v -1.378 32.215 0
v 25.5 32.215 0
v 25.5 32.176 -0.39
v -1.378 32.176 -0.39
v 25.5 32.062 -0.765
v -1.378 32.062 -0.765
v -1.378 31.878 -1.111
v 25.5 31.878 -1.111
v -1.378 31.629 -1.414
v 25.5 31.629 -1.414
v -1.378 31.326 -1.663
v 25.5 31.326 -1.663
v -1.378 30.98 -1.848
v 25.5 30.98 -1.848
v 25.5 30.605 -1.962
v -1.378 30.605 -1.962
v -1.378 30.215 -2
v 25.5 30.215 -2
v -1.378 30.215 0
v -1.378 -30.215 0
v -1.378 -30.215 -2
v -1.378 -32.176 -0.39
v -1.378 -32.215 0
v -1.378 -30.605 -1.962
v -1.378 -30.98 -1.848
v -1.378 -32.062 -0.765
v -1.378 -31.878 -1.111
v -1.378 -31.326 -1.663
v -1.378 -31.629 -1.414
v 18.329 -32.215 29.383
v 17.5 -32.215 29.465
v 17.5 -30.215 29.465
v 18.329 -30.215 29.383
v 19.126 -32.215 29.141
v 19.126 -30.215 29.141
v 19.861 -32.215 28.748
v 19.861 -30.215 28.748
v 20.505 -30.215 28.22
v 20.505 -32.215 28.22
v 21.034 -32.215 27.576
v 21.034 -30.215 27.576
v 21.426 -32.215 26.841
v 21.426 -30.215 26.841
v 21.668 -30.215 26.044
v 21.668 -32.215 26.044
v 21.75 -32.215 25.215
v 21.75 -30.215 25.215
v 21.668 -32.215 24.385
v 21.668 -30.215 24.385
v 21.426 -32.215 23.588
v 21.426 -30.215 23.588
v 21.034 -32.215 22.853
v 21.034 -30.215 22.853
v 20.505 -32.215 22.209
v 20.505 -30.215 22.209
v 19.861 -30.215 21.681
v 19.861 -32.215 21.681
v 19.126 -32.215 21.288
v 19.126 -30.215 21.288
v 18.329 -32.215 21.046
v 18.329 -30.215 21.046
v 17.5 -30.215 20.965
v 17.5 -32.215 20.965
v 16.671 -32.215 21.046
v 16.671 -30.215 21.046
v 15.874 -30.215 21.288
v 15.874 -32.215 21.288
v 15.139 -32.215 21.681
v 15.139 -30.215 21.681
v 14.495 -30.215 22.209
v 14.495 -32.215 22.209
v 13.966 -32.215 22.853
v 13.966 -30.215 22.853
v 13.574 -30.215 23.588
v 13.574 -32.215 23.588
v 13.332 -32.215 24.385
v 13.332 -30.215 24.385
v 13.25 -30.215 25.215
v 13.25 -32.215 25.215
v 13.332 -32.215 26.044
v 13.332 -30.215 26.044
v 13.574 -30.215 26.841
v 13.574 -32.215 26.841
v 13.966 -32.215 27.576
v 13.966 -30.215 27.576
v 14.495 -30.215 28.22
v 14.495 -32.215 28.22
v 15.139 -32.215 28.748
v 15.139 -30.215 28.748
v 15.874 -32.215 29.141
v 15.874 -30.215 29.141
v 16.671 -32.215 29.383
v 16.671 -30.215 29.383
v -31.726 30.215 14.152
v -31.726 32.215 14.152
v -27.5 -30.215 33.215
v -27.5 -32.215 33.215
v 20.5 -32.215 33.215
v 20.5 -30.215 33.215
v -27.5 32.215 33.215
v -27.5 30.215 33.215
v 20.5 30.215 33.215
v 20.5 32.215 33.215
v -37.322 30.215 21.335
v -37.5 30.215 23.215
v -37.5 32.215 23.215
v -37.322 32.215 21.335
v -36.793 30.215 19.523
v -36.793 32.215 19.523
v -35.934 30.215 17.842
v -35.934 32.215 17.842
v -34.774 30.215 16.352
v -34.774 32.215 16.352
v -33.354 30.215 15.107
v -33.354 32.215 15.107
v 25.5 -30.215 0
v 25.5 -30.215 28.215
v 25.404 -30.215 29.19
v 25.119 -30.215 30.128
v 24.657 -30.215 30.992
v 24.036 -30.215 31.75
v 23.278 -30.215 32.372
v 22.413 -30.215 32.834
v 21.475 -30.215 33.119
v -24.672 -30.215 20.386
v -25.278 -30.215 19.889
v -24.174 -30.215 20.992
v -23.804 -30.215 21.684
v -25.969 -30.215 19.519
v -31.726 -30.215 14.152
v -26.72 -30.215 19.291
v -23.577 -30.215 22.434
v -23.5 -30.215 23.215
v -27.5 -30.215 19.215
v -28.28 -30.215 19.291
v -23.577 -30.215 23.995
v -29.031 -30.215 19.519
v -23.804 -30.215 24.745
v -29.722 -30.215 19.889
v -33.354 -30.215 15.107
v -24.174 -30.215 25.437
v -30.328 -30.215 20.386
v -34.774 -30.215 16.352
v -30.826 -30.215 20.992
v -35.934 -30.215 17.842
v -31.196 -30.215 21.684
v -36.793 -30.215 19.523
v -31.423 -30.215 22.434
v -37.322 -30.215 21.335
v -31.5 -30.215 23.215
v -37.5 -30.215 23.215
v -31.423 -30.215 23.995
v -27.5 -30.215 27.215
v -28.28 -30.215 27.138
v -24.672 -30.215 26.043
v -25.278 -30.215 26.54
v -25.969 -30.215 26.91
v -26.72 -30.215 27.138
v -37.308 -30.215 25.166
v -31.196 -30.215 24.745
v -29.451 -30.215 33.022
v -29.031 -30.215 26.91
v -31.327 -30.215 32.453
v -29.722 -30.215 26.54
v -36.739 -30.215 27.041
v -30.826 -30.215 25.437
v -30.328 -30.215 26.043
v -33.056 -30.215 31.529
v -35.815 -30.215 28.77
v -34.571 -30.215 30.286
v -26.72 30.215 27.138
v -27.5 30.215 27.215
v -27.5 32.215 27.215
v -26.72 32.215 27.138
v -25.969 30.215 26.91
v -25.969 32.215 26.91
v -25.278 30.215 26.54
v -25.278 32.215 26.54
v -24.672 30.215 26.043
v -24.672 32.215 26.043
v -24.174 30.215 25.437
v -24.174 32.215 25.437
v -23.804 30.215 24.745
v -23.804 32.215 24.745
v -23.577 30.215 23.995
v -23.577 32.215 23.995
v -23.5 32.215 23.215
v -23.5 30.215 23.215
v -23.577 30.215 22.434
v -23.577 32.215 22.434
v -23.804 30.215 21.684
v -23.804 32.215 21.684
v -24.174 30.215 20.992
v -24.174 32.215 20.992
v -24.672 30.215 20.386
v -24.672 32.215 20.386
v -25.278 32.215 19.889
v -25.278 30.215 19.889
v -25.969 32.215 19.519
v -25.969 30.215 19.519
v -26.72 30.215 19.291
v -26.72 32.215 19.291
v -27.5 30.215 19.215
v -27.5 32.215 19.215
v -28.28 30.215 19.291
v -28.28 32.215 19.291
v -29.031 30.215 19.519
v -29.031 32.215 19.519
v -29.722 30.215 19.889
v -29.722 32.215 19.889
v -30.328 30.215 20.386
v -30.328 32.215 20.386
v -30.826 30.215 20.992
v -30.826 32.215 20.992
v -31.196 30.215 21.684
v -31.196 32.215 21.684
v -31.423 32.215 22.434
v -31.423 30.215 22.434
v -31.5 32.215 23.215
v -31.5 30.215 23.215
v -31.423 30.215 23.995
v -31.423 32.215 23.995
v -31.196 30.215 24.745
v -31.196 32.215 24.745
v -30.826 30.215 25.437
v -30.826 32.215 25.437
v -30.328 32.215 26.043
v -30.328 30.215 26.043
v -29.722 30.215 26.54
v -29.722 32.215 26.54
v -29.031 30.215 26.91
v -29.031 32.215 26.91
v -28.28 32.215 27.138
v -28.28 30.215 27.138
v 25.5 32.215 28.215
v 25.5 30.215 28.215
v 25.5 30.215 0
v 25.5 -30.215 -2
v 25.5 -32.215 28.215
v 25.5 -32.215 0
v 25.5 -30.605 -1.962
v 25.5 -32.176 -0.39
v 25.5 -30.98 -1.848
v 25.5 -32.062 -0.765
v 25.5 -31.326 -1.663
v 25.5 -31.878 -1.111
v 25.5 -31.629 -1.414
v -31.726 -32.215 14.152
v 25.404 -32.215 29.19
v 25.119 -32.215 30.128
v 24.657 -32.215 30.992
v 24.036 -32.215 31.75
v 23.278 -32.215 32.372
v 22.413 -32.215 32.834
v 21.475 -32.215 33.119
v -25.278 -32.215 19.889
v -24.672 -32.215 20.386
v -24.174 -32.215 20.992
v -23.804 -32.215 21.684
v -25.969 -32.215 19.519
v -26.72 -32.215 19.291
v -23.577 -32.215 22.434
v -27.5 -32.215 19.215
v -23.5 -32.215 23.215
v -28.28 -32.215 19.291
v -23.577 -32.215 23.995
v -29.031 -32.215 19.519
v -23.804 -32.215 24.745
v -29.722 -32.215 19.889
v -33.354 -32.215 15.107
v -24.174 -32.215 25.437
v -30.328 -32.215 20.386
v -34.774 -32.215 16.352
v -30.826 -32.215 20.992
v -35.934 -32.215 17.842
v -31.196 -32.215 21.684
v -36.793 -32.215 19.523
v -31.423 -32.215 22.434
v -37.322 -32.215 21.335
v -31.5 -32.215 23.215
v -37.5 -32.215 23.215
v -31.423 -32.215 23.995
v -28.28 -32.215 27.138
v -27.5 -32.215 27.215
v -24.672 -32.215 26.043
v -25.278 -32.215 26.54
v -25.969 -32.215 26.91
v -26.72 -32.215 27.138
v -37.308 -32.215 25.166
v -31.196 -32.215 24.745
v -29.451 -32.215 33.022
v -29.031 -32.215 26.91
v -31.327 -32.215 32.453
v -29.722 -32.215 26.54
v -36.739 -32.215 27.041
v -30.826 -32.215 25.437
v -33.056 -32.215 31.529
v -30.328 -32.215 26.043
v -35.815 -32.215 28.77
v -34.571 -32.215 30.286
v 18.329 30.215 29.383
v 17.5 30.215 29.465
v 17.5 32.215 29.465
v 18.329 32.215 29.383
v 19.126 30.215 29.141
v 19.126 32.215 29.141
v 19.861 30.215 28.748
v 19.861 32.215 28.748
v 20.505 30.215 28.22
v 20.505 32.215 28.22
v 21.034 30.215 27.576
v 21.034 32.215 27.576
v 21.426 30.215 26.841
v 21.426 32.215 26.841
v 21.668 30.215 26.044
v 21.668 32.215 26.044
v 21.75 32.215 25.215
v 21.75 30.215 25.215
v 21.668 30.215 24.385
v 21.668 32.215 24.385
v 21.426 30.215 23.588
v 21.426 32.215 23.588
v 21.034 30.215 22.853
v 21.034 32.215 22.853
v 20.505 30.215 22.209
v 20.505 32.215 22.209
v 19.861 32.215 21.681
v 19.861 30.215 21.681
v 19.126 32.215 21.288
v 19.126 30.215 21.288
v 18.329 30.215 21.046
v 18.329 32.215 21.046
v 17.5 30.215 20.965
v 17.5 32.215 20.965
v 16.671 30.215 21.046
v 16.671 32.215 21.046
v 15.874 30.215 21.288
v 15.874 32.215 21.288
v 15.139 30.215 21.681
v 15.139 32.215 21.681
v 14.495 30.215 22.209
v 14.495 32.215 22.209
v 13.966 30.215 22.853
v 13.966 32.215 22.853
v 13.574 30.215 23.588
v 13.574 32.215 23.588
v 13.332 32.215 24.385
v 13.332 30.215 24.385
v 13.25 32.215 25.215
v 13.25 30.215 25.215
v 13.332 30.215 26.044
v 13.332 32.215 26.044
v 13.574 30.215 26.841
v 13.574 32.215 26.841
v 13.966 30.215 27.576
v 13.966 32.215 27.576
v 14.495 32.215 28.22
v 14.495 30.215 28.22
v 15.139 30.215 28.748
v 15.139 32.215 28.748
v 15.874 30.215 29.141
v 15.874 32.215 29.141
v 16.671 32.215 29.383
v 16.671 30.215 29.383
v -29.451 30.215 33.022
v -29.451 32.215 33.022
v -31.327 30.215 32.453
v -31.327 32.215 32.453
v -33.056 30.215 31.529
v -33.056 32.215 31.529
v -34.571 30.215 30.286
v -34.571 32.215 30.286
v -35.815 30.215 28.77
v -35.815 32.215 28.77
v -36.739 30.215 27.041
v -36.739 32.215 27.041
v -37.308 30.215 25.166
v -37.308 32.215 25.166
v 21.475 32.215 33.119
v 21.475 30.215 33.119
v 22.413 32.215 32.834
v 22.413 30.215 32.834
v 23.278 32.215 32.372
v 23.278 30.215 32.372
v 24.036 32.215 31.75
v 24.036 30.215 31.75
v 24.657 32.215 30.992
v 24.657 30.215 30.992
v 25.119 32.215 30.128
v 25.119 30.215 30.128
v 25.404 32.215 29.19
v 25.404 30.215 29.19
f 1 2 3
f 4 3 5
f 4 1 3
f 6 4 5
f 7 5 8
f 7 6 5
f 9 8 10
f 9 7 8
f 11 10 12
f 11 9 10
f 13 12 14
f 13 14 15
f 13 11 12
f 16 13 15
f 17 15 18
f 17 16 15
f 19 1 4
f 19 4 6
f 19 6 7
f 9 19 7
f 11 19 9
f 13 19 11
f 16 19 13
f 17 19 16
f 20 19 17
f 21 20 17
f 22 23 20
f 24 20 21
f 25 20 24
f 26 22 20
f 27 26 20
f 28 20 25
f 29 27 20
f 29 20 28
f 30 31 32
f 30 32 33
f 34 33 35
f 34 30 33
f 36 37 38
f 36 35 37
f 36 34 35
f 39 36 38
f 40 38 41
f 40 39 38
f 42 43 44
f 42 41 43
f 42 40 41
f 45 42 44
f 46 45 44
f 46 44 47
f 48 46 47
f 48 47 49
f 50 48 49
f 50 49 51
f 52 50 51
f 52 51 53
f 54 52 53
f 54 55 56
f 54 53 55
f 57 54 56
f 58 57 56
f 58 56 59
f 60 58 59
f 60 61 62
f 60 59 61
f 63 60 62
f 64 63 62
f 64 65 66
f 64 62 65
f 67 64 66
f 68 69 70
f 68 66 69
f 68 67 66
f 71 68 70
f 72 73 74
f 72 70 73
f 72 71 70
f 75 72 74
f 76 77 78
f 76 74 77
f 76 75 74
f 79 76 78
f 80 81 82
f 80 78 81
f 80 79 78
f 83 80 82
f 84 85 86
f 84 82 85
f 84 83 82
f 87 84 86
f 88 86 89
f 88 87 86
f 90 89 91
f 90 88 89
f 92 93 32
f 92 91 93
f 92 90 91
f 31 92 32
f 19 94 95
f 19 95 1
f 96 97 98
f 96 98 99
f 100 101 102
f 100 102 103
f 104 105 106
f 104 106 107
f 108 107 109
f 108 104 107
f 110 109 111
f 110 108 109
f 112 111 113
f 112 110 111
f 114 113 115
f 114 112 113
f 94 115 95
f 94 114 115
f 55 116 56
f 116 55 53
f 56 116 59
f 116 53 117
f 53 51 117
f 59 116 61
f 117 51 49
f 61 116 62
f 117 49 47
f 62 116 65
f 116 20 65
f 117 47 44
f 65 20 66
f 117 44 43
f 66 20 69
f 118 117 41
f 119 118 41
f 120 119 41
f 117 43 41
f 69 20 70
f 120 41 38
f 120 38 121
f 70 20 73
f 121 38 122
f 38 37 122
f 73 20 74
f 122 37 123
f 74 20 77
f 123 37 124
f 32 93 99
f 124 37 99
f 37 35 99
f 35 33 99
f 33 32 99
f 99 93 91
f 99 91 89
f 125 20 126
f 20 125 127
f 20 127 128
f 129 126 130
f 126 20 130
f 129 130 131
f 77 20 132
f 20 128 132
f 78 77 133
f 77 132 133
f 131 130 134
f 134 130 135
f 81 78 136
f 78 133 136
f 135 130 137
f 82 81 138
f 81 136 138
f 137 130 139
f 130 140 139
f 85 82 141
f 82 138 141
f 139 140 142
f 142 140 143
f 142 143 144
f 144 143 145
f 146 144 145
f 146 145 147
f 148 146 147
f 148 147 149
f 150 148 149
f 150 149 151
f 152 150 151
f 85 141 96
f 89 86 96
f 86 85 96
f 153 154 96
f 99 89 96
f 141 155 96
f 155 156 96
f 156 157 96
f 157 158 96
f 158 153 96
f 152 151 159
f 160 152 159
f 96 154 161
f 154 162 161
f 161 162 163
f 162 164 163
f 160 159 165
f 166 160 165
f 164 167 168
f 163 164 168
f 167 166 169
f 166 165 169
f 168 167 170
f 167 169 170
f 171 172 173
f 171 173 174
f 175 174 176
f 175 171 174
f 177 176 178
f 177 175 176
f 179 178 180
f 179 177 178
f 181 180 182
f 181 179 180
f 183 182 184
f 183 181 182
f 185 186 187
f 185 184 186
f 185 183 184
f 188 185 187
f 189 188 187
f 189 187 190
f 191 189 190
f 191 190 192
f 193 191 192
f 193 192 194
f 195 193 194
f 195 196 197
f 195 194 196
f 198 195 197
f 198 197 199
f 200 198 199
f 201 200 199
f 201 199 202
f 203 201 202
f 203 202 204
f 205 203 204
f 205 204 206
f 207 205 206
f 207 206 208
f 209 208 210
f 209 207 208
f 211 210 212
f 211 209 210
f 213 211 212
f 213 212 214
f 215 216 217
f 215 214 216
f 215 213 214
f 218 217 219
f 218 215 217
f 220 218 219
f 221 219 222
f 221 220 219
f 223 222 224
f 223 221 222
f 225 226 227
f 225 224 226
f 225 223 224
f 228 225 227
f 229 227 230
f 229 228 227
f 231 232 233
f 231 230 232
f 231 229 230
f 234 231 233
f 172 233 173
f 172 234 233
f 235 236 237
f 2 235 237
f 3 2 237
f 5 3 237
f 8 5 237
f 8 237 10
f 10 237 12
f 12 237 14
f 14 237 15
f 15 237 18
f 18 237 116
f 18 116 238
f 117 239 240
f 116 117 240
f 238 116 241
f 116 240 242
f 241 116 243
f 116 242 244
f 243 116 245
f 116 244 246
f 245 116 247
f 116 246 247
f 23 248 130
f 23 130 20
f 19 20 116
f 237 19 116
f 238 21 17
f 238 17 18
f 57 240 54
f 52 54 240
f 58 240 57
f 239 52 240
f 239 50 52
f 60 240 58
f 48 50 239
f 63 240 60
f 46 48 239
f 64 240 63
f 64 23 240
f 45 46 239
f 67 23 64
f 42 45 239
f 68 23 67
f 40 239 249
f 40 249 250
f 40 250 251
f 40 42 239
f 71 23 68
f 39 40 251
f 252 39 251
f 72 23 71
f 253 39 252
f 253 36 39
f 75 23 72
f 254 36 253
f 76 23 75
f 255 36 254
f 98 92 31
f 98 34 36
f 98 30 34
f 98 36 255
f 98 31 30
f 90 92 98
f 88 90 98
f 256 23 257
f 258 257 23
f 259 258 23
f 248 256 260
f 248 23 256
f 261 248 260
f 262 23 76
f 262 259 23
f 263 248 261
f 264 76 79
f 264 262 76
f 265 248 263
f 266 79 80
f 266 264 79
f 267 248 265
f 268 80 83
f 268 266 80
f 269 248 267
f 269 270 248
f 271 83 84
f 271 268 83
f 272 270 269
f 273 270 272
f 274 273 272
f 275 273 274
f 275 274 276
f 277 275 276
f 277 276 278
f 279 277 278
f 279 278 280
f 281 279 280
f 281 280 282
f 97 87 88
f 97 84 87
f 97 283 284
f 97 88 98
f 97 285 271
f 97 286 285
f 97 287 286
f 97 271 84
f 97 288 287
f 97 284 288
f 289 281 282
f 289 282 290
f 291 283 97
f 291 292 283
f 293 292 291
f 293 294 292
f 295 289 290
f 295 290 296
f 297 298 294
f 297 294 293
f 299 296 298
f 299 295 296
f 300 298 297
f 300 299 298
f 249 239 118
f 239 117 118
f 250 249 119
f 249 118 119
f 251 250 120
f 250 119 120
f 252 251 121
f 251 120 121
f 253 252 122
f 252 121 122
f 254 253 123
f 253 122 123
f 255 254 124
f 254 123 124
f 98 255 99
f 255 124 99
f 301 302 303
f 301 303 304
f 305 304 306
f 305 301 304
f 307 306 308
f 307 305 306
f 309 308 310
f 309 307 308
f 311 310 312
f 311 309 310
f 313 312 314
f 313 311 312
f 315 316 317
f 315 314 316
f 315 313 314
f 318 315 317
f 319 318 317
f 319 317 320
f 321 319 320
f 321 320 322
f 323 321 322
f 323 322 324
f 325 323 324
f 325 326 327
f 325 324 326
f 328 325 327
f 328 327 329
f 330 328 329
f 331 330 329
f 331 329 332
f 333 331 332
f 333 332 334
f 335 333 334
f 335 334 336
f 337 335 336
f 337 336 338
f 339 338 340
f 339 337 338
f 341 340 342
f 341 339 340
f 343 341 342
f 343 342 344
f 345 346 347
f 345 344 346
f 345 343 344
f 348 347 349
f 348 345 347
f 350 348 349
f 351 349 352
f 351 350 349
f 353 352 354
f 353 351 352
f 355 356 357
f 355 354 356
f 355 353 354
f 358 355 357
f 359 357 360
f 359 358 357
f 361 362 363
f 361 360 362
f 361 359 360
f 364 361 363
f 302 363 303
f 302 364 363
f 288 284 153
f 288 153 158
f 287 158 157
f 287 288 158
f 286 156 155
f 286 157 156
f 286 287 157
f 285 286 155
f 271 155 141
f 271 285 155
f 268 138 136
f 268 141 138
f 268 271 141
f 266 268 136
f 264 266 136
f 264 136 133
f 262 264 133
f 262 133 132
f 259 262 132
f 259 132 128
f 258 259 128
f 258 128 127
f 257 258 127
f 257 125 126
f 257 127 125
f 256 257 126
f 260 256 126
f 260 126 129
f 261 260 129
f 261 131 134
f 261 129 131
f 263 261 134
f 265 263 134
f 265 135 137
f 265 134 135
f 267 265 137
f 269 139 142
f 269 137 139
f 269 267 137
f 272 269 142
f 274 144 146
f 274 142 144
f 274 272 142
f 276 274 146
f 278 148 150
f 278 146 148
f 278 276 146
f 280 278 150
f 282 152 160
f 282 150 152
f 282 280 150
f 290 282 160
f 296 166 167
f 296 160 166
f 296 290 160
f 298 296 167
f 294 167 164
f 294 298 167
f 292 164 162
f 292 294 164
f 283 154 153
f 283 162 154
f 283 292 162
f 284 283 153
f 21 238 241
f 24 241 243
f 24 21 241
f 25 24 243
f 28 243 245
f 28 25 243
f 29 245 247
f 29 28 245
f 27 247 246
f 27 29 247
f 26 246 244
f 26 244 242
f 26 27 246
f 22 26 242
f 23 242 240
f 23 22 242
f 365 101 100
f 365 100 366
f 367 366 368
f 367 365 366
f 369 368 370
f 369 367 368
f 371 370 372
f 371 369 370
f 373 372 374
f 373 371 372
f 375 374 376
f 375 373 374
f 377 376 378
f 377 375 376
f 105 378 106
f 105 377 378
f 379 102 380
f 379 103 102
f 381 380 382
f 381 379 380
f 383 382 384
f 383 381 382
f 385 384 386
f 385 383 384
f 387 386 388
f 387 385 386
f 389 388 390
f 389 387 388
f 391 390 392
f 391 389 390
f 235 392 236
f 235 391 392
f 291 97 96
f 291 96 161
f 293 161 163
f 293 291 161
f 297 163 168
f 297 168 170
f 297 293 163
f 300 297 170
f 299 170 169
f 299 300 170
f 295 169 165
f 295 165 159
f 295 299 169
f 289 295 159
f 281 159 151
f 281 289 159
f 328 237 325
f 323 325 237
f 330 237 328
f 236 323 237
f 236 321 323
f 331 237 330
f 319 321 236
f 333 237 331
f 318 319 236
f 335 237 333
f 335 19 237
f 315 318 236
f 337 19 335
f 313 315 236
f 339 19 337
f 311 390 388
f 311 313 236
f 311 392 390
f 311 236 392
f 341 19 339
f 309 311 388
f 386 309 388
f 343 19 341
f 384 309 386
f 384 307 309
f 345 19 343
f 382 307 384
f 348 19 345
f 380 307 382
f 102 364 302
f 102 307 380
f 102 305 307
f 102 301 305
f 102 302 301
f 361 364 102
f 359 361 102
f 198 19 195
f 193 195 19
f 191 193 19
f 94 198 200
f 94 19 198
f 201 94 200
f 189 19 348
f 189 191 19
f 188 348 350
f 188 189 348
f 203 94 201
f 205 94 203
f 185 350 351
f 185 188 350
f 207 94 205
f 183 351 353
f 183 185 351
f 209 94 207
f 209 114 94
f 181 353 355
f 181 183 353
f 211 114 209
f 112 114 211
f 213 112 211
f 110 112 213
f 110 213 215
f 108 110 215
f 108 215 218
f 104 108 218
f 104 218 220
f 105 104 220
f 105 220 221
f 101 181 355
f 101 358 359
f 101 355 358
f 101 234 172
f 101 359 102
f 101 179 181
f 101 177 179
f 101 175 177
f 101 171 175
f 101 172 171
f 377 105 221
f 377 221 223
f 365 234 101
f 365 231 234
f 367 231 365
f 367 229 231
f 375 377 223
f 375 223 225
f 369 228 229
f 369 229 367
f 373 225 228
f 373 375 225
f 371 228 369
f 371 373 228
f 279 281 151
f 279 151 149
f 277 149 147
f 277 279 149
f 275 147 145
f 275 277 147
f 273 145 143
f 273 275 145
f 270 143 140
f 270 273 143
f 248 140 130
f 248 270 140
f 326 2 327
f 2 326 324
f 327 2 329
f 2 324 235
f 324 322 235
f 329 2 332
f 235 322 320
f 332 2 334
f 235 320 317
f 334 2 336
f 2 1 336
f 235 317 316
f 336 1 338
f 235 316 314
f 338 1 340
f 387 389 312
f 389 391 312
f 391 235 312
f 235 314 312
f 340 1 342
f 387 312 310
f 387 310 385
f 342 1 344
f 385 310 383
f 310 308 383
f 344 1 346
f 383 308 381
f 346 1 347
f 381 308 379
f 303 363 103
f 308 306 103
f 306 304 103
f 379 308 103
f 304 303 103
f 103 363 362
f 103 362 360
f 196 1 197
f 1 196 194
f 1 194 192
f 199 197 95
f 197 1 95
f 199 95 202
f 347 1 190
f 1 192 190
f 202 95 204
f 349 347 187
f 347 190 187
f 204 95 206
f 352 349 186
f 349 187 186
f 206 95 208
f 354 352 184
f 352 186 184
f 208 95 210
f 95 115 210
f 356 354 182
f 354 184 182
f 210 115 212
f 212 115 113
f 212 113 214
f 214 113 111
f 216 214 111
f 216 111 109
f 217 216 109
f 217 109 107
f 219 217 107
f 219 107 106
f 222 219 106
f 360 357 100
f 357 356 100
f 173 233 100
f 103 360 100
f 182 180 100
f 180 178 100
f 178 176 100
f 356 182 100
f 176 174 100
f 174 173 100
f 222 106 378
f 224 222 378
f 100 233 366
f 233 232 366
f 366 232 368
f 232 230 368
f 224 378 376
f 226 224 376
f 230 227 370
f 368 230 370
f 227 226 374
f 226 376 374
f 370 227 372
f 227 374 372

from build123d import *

# Parameters (mm, degrees)
SKETCH1_W                  = 75
SKETCH1_H                  = 130
BASE_FLANGE1_DEPTH         = 2
SKETCHED_START             = -37.5
SKETCHED_BEND1_DEPTH       = 75
SKETCHED_BEND1_2_OUTLINE_W = 2
SKETCHED_BEND1_2_OUTLINE_H = 33.214601837
SKETCHED_BEND1_2_DEPTH     = 75
CUT_EXTRUDE1_START         = -64.429203673
CUT_EXTRUDE1_DEPTH         = 64.429203673
CUT_EXTRUDE2_DEPTH         = 82.61238914
CUT_EXTRUDE2_DEPTH_BACK    = 82.61238914
SKETCH9_R                  = 4
CUT_EXTRUDE3_DEPTH         = 82.61238914
CUT_EXTRUDE3_DEPTH_BACK    = 82.61238914
SKETCH10_R                 = 4.25
SKETCH10_W                 = 12
SKETCH10_H                 = 100
FILLET7_R                  = 5


# Read off the part's stored shape, not the designer's step: Sketched Bend1, Cut-Extrude1
# Sheet-metal steps are written as plain solids
with BuildPart() as part:
    # Sketch1 → Base-Flange1 (new body)
    with BuildSketch(Plane.XY):
        Rectangle(SKETCH1_W, SKETCH1_H)
    extrude(amount=-BASE_FLANGE1_DEPTH)

    # Sketched Bend1 outline → Sketched Bend1 (cut)
    with BuildSketch(Plane.YZ.offset(SKETCHED_START)):
        with BuildLine():
            Line((65, 0), (32.214601837, 0))
            ThreePointArc((32.214601837, 0), (31.628815399, -1.414213562), (30.214601837, -2))
            Line((30.214601837, -2), (65, -2))
            Line((65, -2), (65, 0))
        make_face()
        with BuildLine():
            Line((-65, -2), (-30.214601837, -2))
            ThreePointArc((-30.214601837, -2), (-31.628815399, -1.414213562), (-32.214601837, 0))
            Line((-32.214601837, 0), (-65, 0))
            Line((-65, 0), (-65, -2))
        make_face()
    extrude(amount=SKETCHED_BEND1_DEPTH, mode=Mode.SUBTRACT)

    # Sketched Bend1 2 outline → Sketched Bend1 2 (add)
    with BuildSketch(Plane.YZ.offset(SKETCHED_START)):
        with Locations((31.214601837, 16.607300919)):
            Rectangle(SKETCHED_BEND1_2_OUTLINE_W, SKETCHED_BEND1_2_OUTLINE_H)
        with Locations((-31.214601837, 16.607300919)):
            Rectangle(SKETCHED_BEND1_2_OUTLINE_W, SKETCHED_BEND1_2_OUTLINE_H)
    extrude(amount=SKETCHED_BEND1_2_DEPTH)

    # Cut-Extrude1 outline → Cut-Extrude1 (cut)
    with BuildSketch(Plane(origin=(0, 32.214601837, 0), x_dir=(1, 0, 0), z_dir=(0, 1, 0)).offset(CUT_EXTRUDE1_START)):
        with BuildLine():
            Line((-37.5, -33.214601837), (-27.5, -33.214601837))
            ThreePointArc((-27.5, -33.214601837), (-34.571067812, -30.285669649), (-37.5, -23.214601837))
            Line((-37.5, -23.214601837), (-37.5, -33.214601837))
        make_face()
        with BuildLine():
            ThreePointArc((-37.5, -23.214601837), (-35.933914458, -17.841605753), (-31.726182617, -14.151523966))
            Line((-31.726182617, -14.151523966), (-1.378141536, 0))
            Line((-1.378141536, 0), (-1.378141536, 2))
            Line((-1.378141536, 2), (-37.5, 2))
            Line((-37.5, 2), (-37.5, -23.214601837))
        make_face()
    extrude(amount=CUT_EXTRUDE1_DEPTH, mode=Mode.SUBTRACT)

    # Sketch9 → Cut-Extrude2 (cut, two sides: drawn at the far end of the back side and taken through both)
    with BuildSketch(Plane(origin=(0, 32.214601837, 0), x_dir=(1, 0, 0), z_dir=(0, 1, 0)).offset(-CUT_EXTRUDE2_DEPTH_BACK)):
        with Locations(Location((-27.5, -23.214601837, 0), (0, 0, 270))):
            Circle(SKETCH9_R)
    extrude(amount=CUT_EXTRUDE2_DEPTH + CUT_EXTRUDE2_DEPTH_BACK, mode=Mode.SUBTRACT)

    # Sketch10 → Cut-Extrude3 (cut, two sides: drawn at the far end of the back side and taken through both)
    with BuildSketch(Plane(origin=(0, 32.214601837, 0), x_dir=(1, 0, 0), z_dir=(0, 1, 0)).offset(-CUT_EXTRUDE3_DEPTH_BACK)):
        with Locations(Location((17.5, -25.214601837, 0), (0, 0, 270))):
            Circle(SKETCH10_R)
        with Locations((31.5, 16.785398163)):
            Rectangle(SKETCH10_W, SKETCH10_H)
    extrude(amount=CUT_EXTRUDE3_DEPTH + CUT_EXTRUDE3_DEPTH_BACK, mode=Mode.SUBTRACT)

    # Fillet7
    fillet7_edges = [part.edges().sort_by_distance(p)[0] for p in [
        (25.5, 31.214601837, 33.214601837),
        (25.5, -31.214601837, 33.214601837),
    ]]
    fillet(fillet7_edges, radius=FILLET7_R)


solid = part.part
